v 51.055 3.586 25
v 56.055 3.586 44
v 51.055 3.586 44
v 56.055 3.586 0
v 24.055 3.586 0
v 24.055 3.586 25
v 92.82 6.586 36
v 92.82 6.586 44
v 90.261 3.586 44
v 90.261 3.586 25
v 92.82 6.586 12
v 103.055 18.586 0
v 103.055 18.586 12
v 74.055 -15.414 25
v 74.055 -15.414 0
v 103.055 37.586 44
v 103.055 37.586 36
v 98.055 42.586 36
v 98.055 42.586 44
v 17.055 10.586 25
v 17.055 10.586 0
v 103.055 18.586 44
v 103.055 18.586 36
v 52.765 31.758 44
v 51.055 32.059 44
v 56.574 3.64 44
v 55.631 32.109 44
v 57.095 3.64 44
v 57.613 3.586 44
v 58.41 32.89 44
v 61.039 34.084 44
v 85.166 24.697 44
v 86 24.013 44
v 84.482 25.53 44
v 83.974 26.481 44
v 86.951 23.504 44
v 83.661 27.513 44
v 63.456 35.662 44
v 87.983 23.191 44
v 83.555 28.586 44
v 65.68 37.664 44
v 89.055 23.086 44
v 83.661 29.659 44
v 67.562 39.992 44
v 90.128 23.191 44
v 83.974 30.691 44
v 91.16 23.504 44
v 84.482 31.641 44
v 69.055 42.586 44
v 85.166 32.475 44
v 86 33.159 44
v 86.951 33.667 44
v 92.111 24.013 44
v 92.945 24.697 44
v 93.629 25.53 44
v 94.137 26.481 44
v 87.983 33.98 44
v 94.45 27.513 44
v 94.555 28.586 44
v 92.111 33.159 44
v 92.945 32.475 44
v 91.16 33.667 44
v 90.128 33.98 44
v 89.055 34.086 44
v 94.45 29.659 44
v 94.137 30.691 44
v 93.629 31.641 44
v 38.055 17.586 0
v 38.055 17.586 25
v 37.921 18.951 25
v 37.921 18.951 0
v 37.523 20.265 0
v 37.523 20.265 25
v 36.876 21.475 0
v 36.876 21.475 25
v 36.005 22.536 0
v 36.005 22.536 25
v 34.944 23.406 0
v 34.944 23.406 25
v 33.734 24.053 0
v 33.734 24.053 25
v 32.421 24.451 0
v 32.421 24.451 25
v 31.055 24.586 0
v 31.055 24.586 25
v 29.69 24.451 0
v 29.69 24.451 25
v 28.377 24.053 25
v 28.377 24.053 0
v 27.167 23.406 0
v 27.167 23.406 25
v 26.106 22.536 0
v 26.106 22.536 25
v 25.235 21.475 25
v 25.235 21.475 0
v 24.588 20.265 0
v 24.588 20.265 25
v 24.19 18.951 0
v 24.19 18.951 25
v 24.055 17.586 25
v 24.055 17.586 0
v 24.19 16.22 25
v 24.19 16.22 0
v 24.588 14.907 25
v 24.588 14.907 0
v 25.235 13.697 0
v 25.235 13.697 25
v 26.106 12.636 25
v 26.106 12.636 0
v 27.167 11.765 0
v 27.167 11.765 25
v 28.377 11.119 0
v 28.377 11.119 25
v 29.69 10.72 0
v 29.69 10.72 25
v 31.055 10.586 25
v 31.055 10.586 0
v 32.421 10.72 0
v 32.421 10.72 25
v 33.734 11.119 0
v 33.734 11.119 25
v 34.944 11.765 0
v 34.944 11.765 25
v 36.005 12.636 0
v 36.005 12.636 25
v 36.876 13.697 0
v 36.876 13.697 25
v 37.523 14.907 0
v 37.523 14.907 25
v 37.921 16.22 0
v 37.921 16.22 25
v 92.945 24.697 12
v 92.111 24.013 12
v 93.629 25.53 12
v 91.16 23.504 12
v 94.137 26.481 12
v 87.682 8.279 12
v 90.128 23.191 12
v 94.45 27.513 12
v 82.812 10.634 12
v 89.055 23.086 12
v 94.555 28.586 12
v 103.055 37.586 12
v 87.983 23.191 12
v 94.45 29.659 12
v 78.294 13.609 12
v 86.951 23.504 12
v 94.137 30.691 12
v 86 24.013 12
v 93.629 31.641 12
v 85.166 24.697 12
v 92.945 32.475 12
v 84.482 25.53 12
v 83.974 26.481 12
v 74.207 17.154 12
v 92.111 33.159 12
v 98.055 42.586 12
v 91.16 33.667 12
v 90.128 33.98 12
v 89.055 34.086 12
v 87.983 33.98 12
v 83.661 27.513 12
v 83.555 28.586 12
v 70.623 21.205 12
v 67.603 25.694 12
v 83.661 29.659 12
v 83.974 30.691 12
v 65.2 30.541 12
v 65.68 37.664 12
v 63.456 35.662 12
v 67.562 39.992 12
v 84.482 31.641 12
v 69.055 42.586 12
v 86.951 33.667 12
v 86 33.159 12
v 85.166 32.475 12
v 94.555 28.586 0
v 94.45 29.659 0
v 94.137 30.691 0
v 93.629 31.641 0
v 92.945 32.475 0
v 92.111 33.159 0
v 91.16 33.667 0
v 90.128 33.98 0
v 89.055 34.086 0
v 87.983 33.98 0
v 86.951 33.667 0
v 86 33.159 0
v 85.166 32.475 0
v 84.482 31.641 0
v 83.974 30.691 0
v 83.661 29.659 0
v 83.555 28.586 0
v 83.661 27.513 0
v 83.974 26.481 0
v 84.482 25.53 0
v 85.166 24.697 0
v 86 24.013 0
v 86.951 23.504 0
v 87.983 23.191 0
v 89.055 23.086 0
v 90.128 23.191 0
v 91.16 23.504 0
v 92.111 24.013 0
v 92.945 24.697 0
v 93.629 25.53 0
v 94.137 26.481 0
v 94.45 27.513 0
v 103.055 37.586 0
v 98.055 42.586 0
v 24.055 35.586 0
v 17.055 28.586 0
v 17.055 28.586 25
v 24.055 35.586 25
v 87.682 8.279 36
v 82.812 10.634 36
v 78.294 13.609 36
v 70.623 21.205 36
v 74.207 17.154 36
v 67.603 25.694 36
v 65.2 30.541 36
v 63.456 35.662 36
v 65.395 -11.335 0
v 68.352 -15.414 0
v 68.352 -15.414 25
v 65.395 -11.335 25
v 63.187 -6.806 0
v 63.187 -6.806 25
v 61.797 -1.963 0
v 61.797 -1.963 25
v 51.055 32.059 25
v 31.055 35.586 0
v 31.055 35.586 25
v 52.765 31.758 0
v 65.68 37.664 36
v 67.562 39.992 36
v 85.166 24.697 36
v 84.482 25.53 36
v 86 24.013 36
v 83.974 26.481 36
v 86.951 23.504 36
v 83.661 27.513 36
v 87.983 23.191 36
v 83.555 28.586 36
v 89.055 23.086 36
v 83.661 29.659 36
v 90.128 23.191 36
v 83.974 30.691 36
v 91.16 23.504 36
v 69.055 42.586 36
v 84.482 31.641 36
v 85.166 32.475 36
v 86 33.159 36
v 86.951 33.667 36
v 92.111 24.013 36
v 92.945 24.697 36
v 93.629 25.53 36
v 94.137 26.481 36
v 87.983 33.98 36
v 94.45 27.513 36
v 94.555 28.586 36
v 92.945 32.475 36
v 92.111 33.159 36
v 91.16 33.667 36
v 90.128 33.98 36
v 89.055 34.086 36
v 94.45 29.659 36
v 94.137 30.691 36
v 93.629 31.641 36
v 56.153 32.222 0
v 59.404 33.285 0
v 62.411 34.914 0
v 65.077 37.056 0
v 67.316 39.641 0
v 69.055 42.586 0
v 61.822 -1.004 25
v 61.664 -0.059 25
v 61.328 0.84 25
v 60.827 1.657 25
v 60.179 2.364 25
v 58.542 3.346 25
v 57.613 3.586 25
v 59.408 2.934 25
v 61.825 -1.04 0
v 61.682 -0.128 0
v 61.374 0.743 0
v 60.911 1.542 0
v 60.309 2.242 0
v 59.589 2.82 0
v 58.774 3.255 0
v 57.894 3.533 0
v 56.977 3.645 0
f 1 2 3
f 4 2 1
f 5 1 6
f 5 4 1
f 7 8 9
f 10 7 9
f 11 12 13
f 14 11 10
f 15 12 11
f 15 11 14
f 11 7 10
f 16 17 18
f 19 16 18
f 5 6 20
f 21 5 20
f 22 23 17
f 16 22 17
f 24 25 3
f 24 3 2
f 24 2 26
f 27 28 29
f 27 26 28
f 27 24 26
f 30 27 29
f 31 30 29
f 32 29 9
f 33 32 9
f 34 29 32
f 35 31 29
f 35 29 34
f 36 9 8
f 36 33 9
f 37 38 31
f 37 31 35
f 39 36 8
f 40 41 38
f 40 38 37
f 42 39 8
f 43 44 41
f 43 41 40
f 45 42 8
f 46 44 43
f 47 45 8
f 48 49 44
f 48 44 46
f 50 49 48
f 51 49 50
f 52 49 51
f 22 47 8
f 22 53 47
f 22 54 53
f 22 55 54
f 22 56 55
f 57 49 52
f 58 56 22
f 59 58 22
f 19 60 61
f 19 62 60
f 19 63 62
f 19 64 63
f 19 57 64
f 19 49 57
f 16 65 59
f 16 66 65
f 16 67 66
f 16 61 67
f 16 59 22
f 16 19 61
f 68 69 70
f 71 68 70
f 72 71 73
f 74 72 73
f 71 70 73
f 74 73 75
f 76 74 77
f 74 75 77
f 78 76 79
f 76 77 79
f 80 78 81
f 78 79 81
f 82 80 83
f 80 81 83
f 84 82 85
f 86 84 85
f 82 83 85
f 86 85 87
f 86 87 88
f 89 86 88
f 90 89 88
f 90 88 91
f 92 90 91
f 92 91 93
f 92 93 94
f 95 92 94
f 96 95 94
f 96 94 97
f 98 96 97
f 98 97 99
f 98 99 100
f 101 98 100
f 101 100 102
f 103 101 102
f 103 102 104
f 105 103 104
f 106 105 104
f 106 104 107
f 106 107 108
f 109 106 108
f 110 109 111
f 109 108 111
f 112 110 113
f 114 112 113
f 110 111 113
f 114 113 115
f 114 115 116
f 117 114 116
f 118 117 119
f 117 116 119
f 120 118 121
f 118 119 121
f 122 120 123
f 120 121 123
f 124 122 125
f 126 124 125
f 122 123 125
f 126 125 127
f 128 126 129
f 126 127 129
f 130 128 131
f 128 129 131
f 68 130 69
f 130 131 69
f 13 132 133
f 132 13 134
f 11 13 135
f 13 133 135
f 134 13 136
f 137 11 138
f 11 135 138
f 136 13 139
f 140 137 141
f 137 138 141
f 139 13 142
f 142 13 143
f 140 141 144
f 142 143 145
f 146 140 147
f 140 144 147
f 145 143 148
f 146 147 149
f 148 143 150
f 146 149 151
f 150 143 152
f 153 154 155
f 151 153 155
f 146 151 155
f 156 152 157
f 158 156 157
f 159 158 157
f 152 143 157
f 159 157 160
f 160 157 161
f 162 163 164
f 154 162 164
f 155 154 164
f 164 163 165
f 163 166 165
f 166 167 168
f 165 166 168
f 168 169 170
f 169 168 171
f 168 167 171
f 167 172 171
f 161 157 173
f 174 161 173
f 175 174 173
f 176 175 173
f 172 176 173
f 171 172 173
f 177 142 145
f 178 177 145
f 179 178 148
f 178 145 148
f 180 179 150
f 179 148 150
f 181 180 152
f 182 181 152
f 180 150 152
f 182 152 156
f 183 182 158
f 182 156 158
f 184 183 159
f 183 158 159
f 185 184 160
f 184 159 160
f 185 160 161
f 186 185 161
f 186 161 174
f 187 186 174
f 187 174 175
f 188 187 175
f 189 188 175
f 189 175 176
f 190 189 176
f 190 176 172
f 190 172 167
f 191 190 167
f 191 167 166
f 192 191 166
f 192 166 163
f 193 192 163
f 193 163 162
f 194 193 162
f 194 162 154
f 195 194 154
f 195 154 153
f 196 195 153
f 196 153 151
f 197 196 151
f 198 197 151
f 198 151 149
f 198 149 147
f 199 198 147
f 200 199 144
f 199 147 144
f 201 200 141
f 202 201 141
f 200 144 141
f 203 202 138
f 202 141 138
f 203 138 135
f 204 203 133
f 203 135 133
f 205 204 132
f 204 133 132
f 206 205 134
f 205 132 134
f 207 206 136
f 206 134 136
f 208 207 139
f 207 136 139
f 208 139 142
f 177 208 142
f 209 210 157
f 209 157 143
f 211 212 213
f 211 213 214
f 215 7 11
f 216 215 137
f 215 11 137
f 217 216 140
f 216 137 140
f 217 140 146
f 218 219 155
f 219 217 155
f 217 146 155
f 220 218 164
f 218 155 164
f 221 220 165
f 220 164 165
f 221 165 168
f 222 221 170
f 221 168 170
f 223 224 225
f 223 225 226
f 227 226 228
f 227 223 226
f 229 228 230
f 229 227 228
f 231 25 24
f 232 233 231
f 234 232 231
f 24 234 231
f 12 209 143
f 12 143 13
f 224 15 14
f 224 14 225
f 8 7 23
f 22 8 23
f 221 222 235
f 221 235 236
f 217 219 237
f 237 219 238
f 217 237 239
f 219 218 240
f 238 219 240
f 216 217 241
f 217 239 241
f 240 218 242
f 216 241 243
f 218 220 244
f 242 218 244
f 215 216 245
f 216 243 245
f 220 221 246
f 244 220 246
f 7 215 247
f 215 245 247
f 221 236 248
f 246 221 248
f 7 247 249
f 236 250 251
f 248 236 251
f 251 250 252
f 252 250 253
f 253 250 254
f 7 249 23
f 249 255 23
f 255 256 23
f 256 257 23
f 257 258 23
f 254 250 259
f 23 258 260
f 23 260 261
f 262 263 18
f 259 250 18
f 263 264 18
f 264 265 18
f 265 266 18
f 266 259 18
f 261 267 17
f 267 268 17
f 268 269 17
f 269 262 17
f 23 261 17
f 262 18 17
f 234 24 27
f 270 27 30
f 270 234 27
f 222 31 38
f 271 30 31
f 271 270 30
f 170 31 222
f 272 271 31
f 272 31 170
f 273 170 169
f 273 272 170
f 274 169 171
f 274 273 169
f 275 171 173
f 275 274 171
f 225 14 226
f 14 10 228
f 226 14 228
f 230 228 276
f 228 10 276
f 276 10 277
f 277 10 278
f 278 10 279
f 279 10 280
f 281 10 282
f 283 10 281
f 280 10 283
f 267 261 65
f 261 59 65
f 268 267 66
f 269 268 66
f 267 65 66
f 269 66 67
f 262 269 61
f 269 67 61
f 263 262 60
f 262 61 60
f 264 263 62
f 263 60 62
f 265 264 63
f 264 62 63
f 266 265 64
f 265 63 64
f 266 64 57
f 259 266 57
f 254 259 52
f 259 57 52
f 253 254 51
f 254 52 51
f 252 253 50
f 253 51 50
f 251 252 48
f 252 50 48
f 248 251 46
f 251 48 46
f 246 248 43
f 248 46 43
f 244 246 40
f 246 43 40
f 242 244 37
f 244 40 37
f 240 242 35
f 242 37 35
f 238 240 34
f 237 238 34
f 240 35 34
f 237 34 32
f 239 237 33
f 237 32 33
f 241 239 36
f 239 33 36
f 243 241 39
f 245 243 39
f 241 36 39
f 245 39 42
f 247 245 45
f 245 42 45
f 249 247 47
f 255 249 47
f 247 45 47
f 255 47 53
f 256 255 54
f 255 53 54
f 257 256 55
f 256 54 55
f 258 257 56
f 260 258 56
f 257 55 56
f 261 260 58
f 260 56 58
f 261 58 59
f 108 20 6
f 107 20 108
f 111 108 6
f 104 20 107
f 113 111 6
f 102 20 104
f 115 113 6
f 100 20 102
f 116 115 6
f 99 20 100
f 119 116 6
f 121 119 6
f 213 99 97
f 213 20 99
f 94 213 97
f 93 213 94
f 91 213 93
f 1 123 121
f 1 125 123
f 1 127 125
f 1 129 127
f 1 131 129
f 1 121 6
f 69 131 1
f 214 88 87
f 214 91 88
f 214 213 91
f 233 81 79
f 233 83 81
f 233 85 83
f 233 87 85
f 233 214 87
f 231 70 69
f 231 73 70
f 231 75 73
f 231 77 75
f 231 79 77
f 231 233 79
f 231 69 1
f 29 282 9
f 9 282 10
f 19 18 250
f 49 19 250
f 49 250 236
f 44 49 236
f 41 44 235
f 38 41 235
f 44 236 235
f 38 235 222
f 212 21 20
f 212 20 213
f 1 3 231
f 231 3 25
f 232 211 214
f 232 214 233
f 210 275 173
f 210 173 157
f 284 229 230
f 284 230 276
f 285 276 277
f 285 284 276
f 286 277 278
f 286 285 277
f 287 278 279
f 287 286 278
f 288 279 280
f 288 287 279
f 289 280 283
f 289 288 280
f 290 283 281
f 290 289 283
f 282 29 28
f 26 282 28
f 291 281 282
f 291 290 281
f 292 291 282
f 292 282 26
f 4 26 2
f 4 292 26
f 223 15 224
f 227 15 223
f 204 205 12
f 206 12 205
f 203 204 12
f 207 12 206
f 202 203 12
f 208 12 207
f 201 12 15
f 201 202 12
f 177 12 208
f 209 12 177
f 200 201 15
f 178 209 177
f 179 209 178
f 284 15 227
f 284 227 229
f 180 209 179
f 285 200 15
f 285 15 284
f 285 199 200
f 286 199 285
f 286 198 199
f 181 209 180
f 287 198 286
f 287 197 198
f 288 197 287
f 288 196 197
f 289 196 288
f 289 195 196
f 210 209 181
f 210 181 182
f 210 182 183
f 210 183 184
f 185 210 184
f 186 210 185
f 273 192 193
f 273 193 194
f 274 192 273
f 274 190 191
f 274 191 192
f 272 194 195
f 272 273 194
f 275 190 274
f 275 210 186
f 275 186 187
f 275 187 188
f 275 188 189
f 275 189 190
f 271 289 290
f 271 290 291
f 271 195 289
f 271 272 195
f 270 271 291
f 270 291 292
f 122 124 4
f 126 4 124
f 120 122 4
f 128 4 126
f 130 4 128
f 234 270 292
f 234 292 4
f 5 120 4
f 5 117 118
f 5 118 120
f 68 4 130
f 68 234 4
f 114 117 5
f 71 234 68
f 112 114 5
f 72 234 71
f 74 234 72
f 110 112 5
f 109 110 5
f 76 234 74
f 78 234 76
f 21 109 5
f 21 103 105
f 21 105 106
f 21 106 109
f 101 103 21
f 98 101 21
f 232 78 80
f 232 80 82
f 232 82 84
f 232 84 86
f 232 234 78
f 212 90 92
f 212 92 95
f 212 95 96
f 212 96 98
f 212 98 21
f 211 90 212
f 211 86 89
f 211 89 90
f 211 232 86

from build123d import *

# Parameters (mm, degrees)
BOSS_EXTRU_1_DEPTH      = 44
ESQUISSE2_R             = 7
ENL_V_MAT_EXTRU_1_DEPTH = 44
ENL_V_MAT_EXTRU_2_DEPTH = 19
ESQUISSE4_R             = 5.5
ENL_V_MAT_EXTRU_3_DEPTH = 50
ENL_V_START             = -19
ENL_V_MAT_EXTRU_5_DEPTH = 19
ENL_V_START_2           = -32
ENL_V_MAT_EXTRU_8_DEPTH = 32
BOSS_EXTRU_3_START      = -8
BOSS_EXTRU_3_DEPTH      = 8
ESQUISSE15_R            = 5.5
ENL_V_MAT_EXTRU_9_DEPTH = 44


with BuildPart() as part:
    # Esquisse1 → Boss.-Extru.1 (new body)
    with BuildSketch(Plane.XY):
        with BuildLine():
            Line((69.055498862, 42.585779817), (98.055498862, 42.585779817))
            Line((98.055498862, 42.585779817), (103.055498862, 37.585779817))
            Line((103.055498862, 37.585779817), (103.055498862, 18.585779817))
            Line((103.055498862, 18.585779817), (74.055498862, -15.414220183))
            Line((74.055498862, -15.414220183), (68.352478915, -15.414220183))
            ThreePointArc((68.352478915, -15.414220183), (64.19229693, -9.118662105), (61.797161375, -1.962930743))
            ThreePointArc((61.797161375, -1.962930743), (60.309086392, 2.242265049), (56.055498862, 3.585779817))
            Line((56.055498862, 3.585779817), (24.055498862, 3.585779817))
            Line((24.055498862, 3.585779817), (17.055498862, 10.585779817))
            Line((17.055498862, 10.585779817), (17.055498862, 28.585779817))
            Line((17.055498862, 28.585779817), (24.055498862, 35.585779817))
            Line((24.055498862, 35.585779817), (31.055498862, 35.585779817))
            Line((31.055498862, 35.585779817), (52.765077496, 31.757795364))
            ThreePointArc((52.765077496, 31.757795364), (62.410764196, 34.914360395), (69.055498862, 42.585779817))
        make_face()
    extrude(amount=BOSS_EXTRU_1_DEPTH)

    # Esquisse2 → Enlèv. mat.-Extru.1 (cut)
    with BuildSketch(Plane.XY.offset(44)):
        with Locations((31.055498862, 17.585779817)):
            Circle(ESQUISSE2_R)
    extrude(amount=-ENL_V_MAT_EXTRU_1_DEPTH, mode=Mode.SUBTRACT)

    # Esquisse3 → Enlèv. mat.-Extru.2 (cut)
    with BuildSketch(Plane.XY.offset(44)):
        Polygon((17.055498862, 28.585779817), (17.055498862, 10.585779817), (24.055498862, 3.585779817), (51.055498862, 3.585779817), (51.055498862, 32.059240202), (31.055498862, 35.585779817), (24.055498862, 35.585779817), align=None)
    extrude(amount=-ENL_V_MAT_EXTRU_2_DEPTH, mode=Mode.SUBTRACT)

    # Esquisse4 → Enlèv. mat.-Extru.3 (cut)
    with BuildSketch(Plane.XY.offset(44)):
        with Locations((89.055498862, 28.585779817)):
            Circle(ESQUISSE4_R)
    extrude(amount=-ENL_V_MAT_EXTRU_3_DEPTH, mode=Mode.SUBTRACT)

    # Esquisse10 → Enlèv. mat.-Extru.5 (cut)
    with BuildSketch(Plane.XY.offset(44).offset(ENL_V_START)):
        with BuildLine():
            Line((56.055498862, 3.585779817), (90.261381215, 3.585779817))
            Line((90.261381215, 3.585779817), (74.055498862, -15.414220183))
            Line((74.055498862, -15.414220183), (68.352478915, -15.414220183))
            ThreePointArc((68.352478915, -15.414220183), (64.19229693, -9.118662105), (61.797161375, -1.962930743))
            ThreePointArc((61.797161375, -1.962930743), (60.047831429, 1.971925154), (56.055498862, 3.585779817))
        make_face()
    extrude(amount=ENL_V_MAT_EXTRU_5_DEPTH, mode=Mode.SUBTRACT)

    # Esquisse13 → Enlèv. mat.-Extru.8 (cut)
    with BuildSketch(Plane.XY.offset(44).offset(ENL_V_START_2)):
        with BuildLine():
            Line((69.055498862, 42.585779817), (98.055498862, 42.585779817))
            Line((98.055498862, 42.585779817), (103.055498862, 37.585779817))
            Line((103.055498862, 37.585779817), (103.055498862, 18.585779817))
            Line((103.055498862, 18.585779817), (92.820204745, 6.585779817))
            ThreePointArc((92.820204745, 6.585779817), (74.207332122, 17.1537679), (63.456424114, 35.661587231))
            ThreePointArc((63.456424114, 35.661587231), (66.667333439, 38.791037909), (69.055498862, 42.585779817))
        make_face()
    extrude(amount=ENL_V_MAT_EXTRU_8_DEPTH, mode=Mode.SUBTRACT)

    # Esquisse14 → Boss.-Extru.3 (add)
    with BuildSketch(Plane.XY.offset(44).offset(BOSS_EXTRU_3_START)):
        with BuildLine():
            Line((92.820204745, 6.585779817), (103.055498862, 18.585779817))
            Line((103.055498862, 18.585779817), (103.055498862, 37.585779817))
            Line((103.055498862, 37.585779817), (98.055498862, 42.585779817))
            Line((98.055498862, 42.585779817), (69.055498862, 42.585779817))
            ThreePointArc((69.055498862, 42.585779817), (66.667333439, 38.791037909), (63.456424114, 35.661587231))
            ThreePointArc((63.456424114, 35.661587231), (74.207332122, 17.1537679), (92.820204745, 6.585779817))
        make_face()
    extrude(amount=BOSS_EXTRU_3_DEPTH)

    # Esquisse15 → Enlèv. mat.-Extru.9 (cut)
    with BuildSketch(Plane.XY.offset(44)):
        with Locations((89.055498862, 28.585779817)):
            Circle(ESQUISSE15_R)
    extrude(amount=-ENL_V_MAT_EXTRU_9_DEPTH, mode=Mode.SUBTRACT)


solid = part.part
